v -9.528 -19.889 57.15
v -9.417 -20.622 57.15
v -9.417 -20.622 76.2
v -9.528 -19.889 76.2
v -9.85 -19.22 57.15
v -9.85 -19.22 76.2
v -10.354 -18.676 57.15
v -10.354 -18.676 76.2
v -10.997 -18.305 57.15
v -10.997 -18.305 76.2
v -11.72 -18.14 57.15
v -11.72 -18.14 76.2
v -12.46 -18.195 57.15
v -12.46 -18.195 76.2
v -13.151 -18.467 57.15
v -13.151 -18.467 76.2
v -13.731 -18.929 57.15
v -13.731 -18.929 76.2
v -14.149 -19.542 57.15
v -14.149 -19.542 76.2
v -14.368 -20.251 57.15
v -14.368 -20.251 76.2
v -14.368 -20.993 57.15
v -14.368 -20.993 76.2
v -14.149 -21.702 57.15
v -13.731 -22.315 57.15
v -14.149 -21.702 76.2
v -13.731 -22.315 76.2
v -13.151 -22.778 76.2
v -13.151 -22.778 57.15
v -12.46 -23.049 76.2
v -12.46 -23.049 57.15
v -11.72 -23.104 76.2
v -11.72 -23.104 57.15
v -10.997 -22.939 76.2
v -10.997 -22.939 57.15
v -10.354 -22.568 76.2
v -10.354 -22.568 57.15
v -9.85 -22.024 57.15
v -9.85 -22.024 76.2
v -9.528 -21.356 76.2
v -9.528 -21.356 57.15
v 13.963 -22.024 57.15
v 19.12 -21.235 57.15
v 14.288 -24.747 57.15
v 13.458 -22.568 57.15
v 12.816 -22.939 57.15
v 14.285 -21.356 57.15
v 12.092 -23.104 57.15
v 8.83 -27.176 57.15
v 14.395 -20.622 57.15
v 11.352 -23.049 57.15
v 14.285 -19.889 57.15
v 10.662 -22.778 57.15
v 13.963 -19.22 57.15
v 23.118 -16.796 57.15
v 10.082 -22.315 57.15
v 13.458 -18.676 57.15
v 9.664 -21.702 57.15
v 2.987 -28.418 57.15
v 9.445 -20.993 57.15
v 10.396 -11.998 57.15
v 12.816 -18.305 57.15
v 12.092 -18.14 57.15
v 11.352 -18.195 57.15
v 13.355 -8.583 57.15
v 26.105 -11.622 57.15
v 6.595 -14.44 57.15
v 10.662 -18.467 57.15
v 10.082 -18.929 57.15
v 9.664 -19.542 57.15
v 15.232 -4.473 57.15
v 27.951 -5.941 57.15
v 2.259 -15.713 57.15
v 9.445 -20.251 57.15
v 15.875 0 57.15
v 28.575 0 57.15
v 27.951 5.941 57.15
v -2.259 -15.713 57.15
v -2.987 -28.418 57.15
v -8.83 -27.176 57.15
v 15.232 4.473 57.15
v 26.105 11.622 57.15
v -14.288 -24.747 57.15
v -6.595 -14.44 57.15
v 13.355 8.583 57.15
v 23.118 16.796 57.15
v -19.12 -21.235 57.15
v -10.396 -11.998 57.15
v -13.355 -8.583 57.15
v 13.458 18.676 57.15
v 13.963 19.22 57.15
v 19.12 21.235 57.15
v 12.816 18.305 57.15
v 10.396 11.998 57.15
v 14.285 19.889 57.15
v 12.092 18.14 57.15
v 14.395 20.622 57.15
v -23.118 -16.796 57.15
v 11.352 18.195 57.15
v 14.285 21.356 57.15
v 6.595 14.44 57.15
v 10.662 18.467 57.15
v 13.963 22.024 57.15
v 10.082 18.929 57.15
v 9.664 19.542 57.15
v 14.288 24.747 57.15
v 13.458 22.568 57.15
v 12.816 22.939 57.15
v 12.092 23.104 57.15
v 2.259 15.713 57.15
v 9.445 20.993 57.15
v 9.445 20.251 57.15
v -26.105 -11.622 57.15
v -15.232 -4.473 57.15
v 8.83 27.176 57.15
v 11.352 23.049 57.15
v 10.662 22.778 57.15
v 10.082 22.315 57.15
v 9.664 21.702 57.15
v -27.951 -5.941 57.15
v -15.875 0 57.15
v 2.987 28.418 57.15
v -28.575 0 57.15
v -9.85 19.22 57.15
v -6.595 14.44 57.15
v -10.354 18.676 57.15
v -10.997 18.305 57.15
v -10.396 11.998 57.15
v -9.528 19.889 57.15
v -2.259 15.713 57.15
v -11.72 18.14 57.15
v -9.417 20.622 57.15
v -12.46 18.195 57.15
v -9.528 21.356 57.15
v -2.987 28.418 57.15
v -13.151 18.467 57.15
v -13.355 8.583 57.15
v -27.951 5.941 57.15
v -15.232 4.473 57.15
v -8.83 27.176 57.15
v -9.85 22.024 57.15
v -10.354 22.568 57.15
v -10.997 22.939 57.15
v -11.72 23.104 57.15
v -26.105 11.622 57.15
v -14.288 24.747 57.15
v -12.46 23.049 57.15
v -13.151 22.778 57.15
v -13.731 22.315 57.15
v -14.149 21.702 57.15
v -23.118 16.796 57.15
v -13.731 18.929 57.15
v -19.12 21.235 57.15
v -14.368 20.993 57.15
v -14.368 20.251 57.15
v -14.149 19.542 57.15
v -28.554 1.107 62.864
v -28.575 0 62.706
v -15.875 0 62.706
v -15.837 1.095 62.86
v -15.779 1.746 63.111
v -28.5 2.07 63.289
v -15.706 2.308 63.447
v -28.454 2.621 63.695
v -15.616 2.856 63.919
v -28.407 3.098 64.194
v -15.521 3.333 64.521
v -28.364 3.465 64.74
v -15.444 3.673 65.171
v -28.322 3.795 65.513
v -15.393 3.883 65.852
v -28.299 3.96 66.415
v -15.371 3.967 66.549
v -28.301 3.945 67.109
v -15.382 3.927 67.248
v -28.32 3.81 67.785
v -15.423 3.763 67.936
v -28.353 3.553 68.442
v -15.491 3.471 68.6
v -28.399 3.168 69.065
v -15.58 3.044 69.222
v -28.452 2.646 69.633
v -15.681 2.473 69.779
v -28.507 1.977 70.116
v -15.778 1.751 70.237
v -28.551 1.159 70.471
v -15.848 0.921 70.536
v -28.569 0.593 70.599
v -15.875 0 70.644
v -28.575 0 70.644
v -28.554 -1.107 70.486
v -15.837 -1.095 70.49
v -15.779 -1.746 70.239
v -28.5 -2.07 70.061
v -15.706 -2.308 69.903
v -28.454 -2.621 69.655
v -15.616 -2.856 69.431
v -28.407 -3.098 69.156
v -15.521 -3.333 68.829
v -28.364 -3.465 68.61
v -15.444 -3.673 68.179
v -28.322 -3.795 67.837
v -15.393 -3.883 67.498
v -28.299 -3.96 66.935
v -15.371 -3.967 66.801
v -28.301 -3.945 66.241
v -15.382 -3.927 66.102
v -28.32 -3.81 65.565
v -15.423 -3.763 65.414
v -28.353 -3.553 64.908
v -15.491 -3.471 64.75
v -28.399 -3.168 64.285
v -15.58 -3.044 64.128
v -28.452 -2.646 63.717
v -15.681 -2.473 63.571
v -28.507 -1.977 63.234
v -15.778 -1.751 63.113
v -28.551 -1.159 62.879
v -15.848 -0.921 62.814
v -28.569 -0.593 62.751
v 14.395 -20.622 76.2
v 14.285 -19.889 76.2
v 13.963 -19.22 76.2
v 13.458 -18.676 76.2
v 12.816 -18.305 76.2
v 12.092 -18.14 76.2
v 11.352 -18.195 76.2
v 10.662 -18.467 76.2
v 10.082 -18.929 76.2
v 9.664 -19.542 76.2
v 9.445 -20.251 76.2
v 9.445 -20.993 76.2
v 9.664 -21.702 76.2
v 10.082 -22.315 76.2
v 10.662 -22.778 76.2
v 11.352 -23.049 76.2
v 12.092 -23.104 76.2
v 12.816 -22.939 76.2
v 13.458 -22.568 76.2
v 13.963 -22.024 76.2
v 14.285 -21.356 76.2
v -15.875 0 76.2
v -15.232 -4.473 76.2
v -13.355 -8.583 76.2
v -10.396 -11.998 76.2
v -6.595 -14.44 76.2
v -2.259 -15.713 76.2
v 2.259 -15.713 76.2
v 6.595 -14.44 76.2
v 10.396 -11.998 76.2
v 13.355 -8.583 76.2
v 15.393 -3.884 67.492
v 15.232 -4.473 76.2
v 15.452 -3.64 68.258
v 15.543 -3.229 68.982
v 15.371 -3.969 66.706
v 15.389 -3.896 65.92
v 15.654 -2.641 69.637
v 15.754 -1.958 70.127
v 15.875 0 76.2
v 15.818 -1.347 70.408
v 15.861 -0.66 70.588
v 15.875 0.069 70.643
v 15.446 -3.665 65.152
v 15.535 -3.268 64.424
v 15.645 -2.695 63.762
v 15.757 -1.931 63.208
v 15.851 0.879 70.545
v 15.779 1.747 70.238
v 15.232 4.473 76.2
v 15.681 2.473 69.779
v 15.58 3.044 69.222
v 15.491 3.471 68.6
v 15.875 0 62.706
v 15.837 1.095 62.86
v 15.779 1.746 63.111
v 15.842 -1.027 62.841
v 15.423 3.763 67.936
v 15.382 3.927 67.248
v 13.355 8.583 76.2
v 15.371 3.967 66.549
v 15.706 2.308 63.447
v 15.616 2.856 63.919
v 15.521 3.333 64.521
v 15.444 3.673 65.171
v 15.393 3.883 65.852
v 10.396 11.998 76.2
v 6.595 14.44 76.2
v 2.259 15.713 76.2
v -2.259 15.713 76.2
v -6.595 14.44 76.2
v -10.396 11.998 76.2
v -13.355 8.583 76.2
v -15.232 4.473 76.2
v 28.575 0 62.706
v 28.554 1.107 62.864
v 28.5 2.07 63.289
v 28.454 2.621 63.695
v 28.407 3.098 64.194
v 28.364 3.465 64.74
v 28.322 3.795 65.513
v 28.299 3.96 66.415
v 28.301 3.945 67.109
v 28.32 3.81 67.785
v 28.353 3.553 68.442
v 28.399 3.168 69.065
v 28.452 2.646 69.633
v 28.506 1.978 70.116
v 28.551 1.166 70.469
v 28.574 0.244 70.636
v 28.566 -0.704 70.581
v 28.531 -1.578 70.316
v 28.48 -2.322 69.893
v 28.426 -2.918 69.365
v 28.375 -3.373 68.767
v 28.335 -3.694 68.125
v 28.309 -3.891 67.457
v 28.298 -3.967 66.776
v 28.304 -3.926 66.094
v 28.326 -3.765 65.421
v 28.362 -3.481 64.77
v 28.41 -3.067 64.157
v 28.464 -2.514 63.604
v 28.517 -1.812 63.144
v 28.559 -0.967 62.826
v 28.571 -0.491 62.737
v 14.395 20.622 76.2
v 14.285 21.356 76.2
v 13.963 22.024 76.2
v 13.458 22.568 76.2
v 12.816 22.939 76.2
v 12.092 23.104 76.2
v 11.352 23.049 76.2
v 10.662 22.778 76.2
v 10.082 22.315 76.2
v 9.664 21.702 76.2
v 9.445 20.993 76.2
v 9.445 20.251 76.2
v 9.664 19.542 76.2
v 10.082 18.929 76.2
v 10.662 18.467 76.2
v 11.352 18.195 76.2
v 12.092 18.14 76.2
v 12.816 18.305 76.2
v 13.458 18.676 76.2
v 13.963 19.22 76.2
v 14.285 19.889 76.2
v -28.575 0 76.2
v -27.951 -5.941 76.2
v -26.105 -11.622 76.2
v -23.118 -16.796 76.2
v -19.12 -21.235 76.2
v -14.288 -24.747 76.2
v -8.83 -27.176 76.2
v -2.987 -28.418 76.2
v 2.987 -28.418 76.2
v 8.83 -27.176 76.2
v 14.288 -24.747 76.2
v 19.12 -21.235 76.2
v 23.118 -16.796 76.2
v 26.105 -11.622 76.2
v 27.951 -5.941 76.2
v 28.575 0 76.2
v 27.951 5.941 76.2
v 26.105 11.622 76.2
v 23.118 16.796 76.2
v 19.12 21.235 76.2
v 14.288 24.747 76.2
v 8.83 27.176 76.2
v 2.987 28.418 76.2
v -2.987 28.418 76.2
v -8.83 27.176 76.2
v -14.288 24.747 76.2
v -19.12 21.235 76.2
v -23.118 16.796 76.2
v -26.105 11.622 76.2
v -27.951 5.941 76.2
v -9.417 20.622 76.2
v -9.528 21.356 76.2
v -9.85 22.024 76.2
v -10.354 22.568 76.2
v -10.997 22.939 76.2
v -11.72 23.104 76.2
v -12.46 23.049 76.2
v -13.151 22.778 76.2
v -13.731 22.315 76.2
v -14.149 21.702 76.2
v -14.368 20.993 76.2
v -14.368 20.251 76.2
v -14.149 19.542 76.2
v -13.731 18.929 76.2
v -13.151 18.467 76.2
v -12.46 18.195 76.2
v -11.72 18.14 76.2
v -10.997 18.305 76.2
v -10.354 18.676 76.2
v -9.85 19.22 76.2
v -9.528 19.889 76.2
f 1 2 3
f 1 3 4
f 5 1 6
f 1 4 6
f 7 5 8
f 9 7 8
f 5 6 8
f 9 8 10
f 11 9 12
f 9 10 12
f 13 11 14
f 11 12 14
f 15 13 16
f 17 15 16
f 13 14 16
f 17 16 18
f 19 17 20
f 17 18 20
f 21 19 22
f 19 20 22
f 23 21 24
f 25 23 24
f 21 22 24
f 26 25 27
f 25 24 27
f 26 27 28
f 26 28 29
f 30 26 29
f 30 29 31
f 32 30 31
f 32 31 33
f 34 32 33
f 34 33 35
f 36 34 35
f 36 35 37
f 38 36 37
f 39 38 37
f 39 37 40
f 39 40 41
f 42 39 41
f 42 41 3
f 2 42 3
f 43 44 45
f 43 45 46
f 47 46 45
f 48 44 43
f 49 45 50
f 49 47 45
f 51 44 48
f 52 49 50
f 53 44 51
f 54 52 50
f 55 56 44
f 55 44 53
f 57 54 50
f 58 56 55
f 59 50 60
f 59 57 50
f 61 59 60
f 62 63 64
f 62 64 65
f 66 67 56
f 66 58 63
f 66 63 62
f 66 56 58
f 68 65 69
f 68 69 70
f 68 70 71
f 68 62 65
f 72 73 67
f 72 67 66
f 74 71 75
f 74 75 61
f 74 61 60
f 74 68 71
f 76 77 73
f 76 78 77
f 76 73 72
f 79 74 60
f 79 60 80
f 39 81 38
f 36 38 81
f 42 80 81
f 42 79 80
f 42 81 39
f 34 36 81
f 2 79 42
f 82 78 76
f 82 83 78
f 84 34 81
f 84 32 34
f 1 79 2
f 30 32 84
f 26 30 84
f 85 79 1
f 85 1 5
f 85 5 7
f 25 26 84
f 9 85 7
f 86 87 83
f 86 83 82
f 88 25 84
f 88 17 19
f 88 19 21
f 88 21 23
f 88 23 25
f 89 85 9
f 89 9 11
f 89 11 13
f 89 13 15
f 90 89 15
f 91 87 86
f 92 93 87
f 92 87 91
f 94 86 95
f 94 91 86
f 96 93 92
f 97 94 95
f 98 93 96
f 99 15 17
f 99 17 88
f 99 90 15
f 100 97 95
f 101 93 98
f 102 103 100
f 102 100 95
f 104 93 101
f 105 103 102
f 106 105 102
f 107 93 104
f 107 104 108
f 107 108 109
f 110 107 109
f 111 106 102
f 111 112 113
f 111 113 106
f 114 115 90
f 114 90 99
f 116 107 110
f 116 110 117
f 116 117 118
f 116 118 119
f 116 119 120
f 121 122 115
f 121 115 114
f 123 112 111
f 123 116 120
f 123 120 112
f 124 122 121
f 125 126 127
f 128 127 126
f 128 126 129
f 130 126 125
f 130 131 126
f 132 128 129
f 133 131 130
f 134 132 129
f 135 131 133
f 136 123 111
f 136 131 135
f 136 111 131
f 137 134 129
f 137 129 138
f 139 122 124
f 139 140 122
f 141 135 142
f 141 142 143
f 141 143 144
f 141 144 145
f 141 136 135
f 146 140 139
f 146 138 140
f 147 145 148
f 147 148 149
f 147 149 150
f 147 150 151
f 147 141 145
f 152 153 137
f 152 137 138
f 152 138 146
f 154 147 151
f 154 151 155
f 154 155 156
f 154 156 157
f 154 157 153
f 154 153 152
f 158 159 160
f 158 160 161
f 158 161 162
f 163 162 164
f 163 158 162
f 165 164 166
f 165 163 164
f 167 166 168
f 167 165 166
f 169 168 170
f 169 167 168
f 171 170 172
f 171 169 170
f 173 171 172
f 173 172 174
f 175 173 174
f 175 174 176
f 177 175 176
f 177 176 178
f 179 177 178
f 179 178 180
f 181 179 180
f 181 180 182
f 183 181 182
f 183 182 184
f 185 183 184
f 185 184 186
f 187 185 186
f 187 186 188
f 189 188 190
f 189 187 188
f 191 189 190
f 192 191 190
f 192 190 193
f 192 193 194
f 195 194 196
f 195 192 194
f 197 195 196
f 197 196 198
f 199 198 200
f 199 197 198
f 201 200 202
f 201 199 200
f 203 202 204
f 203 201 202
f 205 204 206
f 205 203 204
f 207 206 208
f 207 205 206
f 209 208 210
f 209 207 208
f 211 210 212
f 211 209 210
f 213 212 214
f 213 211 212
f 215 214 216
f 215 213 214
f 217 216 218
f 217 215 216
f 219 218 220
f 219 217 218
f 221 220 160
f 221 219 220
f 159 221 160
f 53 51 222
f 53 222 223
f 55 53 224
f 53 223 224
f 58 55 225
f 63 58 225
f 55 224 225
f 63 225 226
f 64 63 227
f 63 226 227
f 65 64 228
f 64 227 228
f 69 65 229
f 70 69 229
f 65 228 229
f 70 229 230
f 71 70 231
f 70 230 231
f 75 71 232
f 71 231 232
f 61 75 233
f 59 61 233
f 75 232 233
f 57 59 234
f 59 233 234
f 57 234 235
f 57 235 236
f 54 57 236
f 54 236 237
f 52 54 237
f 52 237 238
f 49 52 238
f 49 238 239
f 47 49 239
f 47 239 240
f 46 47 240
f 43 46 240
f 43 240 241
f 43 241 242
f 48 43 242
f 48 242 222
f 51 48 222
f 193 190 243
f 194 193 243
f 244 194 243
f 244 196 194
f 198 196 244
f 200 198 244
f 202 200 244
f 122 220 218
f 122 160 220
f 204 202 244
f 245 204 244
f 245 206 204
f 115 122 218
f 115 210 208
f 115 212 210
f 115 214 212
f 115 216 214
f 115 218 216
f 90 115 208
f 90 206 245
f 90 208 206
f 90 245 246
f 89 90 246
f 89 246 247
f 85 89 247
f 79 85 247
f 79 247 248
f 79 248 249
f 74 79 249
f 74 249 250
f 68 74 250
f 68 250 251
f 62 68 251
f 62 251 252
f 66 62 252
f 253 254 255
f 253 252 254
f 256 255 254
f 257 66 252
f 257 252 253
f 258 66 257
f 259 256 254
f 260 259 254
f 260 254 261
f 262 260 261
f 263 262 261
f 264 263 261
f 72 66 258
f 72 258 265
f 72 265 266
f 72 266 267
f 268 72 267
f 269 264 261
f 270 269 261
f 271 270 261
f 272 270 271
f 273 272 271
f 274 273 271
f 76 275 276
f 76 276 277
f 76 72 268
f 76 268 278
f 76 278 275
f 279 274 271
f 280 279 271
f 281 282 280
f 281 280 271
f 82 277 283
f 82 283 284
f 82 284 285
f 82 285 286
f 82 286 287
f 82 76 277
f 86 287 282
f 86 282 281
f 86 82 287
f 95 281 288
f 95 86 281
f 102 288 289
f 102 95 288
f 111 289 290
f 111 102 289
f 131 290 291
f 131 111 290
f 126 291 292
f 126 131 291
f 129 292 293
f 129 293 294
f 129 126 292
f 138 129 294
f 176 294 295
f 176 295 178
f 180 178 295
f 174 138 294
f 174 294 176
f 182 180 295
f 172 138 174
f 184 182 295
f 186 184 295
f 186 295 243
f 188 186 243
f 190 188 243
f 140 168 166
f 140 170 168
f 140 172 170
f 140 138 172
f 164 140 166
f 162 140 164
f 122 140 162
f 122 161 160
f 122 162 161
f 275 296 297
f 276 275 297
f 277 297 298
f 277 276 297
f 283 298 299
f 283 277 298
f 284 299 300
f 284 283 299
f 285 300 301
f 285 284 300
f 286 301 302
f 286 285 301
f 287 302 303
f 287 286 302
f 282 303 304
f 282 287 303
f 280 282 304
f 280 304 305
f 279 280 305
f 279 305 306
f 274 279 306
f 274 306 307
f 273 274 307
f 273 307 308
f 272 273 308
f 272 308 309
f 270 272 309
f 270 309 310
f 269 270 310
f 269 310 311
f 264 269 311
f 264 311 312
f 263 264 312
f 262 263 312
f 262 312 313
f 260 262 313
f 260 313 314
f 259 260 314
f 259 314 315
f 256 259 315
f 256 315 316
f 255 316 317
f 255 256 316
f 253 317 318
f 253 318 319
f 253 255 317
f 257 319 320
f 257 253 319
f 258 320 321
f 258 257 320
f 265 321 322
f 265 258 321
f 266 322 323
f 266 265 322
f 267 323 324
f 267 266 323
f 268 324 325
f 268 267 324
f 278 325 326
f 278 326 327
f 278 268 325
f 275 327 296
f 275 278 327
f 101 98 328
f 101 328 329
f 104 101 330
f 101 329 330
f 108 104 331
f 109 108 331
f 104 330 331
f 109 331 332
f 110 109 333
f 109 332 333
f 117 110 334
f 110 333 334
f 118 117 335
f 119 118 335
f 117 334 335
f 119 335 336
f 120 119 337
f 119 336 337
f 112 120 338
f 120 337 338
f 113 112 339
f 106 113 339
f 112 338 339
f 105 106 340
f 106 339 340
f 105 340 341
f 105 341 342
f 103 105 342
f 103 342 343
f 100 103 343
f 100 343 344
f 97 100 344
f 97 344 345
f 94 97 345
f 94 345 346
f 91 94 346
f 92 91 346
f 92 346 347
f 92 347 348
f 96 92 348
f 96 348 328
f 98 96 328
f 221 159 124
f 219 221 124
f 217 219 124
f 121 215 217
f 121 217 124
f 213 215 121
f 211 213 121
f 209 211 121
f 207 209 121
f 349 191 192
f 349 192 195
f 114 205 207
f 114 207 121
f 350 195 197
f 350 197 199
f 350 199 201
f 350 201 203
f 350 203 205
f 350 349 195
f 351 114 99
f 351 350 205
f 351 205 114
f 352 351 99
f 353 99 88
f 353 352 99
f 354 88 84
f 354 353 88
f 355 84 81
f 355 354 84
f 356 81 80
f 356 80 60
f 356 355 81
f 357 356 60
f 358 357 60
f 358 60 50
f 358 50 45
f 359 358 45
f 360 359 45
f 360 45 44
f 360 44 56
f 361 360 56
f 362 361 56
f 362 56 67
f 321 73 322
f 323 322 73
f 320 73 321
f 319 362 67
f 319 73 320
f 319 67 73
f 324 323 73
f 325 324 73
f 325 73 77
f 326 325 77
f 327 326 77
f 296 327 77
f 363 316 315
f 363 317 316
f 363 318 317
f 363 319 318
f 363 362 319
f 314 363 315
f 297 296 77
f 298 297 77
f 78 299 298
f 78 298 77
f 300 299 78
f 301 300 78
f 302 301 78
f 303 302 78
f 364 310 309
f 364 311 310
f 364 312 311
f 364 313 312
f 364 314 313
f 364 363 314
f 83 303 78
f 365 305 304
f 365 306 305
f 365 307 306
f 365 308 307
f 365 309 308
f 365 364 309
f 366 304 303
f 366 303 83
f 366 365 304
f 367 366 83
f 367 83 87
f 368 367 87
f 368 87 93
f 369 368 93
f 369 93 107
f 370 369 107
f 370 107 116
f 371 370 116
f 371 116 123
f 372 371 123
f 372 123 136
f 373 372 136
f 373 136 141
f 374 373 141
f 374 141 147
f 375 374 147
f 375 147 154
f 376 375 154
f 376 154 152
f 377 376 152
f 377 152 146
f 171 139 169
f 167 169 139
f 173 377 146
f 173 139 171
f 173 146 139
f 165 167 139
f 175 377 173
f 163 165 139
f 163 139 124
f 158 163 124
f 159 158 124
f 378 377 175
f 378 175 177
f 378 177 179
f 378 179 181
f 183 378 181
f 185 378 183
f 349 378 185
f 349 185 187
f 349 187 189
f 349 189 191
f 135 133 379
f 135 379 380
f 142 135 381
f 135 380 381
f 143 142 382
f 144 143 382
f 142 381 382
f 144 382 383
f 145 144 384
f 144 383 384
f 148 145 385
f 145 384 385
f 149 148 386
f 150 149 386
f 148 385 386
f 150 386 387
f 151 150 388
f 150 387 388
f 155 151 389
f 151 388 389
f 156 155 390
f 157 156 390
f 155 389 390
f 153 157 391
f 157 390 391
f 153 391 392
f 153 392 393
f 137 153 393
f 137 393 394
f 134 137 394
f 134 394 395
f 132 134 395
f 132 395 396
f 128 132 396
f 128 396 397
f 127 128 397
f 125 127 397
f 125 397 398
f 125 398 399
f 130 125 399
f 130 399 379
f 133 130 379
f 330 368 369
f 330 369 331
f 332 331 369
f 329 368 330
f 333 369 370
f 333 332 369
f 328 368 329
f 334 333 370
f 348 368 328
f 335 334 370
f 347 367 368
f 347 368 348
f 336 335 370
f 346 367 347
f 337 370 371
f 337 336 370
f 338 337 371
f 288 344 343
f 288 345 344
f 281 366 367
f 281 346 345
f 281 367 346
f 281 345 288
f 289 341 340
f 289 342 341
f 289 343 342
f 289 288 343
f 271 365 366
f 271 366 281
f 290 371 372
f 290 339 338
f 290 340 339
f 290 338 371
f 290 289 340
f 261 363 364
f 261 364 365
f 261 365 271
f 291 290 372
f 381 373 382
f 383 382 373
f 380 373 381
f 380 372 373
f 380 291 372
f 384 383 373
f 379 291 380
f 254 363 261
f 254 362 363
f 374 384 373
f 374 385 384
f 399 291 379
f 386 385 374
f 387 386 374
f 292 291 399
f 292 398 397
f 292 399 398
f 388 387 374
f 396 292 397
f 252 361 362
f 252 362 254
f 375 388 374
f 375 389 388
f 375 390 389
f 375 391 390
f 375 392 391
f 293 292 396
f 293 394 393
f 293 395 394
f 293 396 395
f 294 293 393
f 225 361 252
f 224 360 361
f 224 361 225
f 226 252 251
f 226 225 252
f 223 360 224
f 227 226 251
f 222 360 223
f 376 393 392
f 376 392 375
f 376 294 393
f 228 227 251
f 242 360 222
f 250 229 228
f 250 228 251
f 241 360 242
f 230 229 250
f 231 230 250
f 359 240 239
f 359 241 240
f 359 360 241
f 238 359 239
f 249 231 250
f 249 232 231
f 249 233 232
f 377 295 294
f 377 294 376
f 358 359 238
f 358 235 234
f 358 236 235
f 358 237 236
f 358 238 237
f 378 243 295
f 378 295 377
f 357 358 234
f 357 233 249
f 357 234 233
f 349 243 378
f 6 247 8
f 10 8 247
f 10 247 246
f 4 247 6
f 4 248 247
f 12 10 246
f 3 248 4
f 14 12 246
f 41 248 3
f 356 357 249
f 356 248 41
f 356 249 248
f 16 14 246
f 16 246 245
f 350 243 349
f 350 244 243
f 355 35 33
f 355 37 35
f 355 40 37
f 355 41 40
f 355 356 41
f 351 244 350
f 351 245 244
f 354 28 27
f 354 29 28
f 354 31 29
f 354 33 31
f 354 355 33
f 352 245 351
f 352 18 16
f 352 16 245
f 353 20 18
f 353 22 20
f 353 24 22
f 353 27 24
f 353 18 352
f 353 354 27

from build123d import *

# Parameters (mm, degrees)
SKETCH3_R                  = 28.575
SKETCH3_R_2                = 15.875
BOSS_EXTRUDE1_DEPTH        = 76.2
SKETCH4_R                  = 39.559010108
CUT_EXTRUDE1_DEPTH         = 133.35
F_9_0_196_DIAMETER_HOLE1_D = 4.9784
CUT_EXTRUDE2_DEPTH         = 87.252543441
CUT_EXTRUDE2_DEPTH_BACK    = 87.252543441
SKETCH7_R                  = 3.96875


with BuildPart() as part:
    # Sketch3 → Boss-Extrude1 (new, symmetric)
    with BuildSketch(Plane.XY):
        with Locations(Location((0, 0, 0), (0, 0, 180))):
            Circle(SKETCH3_R)
        with Locations(Location((0, 0, 0), (0, 0, 180))):
            Circle(SKETCH3_R_2, mode=Mode.SUBTRACT)
    extrude(amount=BOSS_EXTRUDE1_DEPTH, both=True)

    # Sketch4 → Cut-Extrude1 (cut)
    with BuildSketch(Plane(origin=(0, 0, -76.2), x_dir=(-1, 0, 0), z_dir=(0, 0, -1))):
        Circle(SKETCH4_R)
    extrude(amount=-CUT_EXTRUDE1_DEPTH, mode=Mode.SUBTRACT)

    # #9 (0.196) Diameter Hole1 (through all)
    with Locations(Plane(origin=(0, 0, 57.15), x_dir=(-1, 0, 0), z_dir=(0, 0, -1))):
        with Locations((-11.90625, -20.622229928), (-11.90625, 20.622229928), (11.90625, 20.622229928), (11.90625, -20.622229928)):
            Hole(F_9_0_196_DIAMETER_HOLE1_D / 2)

    # Sketch7 → Cut-Extrude2 (cut, two sides: drawn at the far end of the back side and taken through both)
    with BuildSketch(Plane(origin=(0, 0, 0), x_dir=(0, 0, -1), z_dir=(1, 0, 0)).offset(-CUT_EXTRUDE2_DEPTH_BACK)):
        with Locations((-66.675, 0)):
            Circle(SKETCH7_R)
    extrude(amount=CUT_EXTRUDE2_DEPTH + CUT_EXTRUDE2_DEPTH_BACK, mode=Mode.SUBTRACT)


solid = part.part
